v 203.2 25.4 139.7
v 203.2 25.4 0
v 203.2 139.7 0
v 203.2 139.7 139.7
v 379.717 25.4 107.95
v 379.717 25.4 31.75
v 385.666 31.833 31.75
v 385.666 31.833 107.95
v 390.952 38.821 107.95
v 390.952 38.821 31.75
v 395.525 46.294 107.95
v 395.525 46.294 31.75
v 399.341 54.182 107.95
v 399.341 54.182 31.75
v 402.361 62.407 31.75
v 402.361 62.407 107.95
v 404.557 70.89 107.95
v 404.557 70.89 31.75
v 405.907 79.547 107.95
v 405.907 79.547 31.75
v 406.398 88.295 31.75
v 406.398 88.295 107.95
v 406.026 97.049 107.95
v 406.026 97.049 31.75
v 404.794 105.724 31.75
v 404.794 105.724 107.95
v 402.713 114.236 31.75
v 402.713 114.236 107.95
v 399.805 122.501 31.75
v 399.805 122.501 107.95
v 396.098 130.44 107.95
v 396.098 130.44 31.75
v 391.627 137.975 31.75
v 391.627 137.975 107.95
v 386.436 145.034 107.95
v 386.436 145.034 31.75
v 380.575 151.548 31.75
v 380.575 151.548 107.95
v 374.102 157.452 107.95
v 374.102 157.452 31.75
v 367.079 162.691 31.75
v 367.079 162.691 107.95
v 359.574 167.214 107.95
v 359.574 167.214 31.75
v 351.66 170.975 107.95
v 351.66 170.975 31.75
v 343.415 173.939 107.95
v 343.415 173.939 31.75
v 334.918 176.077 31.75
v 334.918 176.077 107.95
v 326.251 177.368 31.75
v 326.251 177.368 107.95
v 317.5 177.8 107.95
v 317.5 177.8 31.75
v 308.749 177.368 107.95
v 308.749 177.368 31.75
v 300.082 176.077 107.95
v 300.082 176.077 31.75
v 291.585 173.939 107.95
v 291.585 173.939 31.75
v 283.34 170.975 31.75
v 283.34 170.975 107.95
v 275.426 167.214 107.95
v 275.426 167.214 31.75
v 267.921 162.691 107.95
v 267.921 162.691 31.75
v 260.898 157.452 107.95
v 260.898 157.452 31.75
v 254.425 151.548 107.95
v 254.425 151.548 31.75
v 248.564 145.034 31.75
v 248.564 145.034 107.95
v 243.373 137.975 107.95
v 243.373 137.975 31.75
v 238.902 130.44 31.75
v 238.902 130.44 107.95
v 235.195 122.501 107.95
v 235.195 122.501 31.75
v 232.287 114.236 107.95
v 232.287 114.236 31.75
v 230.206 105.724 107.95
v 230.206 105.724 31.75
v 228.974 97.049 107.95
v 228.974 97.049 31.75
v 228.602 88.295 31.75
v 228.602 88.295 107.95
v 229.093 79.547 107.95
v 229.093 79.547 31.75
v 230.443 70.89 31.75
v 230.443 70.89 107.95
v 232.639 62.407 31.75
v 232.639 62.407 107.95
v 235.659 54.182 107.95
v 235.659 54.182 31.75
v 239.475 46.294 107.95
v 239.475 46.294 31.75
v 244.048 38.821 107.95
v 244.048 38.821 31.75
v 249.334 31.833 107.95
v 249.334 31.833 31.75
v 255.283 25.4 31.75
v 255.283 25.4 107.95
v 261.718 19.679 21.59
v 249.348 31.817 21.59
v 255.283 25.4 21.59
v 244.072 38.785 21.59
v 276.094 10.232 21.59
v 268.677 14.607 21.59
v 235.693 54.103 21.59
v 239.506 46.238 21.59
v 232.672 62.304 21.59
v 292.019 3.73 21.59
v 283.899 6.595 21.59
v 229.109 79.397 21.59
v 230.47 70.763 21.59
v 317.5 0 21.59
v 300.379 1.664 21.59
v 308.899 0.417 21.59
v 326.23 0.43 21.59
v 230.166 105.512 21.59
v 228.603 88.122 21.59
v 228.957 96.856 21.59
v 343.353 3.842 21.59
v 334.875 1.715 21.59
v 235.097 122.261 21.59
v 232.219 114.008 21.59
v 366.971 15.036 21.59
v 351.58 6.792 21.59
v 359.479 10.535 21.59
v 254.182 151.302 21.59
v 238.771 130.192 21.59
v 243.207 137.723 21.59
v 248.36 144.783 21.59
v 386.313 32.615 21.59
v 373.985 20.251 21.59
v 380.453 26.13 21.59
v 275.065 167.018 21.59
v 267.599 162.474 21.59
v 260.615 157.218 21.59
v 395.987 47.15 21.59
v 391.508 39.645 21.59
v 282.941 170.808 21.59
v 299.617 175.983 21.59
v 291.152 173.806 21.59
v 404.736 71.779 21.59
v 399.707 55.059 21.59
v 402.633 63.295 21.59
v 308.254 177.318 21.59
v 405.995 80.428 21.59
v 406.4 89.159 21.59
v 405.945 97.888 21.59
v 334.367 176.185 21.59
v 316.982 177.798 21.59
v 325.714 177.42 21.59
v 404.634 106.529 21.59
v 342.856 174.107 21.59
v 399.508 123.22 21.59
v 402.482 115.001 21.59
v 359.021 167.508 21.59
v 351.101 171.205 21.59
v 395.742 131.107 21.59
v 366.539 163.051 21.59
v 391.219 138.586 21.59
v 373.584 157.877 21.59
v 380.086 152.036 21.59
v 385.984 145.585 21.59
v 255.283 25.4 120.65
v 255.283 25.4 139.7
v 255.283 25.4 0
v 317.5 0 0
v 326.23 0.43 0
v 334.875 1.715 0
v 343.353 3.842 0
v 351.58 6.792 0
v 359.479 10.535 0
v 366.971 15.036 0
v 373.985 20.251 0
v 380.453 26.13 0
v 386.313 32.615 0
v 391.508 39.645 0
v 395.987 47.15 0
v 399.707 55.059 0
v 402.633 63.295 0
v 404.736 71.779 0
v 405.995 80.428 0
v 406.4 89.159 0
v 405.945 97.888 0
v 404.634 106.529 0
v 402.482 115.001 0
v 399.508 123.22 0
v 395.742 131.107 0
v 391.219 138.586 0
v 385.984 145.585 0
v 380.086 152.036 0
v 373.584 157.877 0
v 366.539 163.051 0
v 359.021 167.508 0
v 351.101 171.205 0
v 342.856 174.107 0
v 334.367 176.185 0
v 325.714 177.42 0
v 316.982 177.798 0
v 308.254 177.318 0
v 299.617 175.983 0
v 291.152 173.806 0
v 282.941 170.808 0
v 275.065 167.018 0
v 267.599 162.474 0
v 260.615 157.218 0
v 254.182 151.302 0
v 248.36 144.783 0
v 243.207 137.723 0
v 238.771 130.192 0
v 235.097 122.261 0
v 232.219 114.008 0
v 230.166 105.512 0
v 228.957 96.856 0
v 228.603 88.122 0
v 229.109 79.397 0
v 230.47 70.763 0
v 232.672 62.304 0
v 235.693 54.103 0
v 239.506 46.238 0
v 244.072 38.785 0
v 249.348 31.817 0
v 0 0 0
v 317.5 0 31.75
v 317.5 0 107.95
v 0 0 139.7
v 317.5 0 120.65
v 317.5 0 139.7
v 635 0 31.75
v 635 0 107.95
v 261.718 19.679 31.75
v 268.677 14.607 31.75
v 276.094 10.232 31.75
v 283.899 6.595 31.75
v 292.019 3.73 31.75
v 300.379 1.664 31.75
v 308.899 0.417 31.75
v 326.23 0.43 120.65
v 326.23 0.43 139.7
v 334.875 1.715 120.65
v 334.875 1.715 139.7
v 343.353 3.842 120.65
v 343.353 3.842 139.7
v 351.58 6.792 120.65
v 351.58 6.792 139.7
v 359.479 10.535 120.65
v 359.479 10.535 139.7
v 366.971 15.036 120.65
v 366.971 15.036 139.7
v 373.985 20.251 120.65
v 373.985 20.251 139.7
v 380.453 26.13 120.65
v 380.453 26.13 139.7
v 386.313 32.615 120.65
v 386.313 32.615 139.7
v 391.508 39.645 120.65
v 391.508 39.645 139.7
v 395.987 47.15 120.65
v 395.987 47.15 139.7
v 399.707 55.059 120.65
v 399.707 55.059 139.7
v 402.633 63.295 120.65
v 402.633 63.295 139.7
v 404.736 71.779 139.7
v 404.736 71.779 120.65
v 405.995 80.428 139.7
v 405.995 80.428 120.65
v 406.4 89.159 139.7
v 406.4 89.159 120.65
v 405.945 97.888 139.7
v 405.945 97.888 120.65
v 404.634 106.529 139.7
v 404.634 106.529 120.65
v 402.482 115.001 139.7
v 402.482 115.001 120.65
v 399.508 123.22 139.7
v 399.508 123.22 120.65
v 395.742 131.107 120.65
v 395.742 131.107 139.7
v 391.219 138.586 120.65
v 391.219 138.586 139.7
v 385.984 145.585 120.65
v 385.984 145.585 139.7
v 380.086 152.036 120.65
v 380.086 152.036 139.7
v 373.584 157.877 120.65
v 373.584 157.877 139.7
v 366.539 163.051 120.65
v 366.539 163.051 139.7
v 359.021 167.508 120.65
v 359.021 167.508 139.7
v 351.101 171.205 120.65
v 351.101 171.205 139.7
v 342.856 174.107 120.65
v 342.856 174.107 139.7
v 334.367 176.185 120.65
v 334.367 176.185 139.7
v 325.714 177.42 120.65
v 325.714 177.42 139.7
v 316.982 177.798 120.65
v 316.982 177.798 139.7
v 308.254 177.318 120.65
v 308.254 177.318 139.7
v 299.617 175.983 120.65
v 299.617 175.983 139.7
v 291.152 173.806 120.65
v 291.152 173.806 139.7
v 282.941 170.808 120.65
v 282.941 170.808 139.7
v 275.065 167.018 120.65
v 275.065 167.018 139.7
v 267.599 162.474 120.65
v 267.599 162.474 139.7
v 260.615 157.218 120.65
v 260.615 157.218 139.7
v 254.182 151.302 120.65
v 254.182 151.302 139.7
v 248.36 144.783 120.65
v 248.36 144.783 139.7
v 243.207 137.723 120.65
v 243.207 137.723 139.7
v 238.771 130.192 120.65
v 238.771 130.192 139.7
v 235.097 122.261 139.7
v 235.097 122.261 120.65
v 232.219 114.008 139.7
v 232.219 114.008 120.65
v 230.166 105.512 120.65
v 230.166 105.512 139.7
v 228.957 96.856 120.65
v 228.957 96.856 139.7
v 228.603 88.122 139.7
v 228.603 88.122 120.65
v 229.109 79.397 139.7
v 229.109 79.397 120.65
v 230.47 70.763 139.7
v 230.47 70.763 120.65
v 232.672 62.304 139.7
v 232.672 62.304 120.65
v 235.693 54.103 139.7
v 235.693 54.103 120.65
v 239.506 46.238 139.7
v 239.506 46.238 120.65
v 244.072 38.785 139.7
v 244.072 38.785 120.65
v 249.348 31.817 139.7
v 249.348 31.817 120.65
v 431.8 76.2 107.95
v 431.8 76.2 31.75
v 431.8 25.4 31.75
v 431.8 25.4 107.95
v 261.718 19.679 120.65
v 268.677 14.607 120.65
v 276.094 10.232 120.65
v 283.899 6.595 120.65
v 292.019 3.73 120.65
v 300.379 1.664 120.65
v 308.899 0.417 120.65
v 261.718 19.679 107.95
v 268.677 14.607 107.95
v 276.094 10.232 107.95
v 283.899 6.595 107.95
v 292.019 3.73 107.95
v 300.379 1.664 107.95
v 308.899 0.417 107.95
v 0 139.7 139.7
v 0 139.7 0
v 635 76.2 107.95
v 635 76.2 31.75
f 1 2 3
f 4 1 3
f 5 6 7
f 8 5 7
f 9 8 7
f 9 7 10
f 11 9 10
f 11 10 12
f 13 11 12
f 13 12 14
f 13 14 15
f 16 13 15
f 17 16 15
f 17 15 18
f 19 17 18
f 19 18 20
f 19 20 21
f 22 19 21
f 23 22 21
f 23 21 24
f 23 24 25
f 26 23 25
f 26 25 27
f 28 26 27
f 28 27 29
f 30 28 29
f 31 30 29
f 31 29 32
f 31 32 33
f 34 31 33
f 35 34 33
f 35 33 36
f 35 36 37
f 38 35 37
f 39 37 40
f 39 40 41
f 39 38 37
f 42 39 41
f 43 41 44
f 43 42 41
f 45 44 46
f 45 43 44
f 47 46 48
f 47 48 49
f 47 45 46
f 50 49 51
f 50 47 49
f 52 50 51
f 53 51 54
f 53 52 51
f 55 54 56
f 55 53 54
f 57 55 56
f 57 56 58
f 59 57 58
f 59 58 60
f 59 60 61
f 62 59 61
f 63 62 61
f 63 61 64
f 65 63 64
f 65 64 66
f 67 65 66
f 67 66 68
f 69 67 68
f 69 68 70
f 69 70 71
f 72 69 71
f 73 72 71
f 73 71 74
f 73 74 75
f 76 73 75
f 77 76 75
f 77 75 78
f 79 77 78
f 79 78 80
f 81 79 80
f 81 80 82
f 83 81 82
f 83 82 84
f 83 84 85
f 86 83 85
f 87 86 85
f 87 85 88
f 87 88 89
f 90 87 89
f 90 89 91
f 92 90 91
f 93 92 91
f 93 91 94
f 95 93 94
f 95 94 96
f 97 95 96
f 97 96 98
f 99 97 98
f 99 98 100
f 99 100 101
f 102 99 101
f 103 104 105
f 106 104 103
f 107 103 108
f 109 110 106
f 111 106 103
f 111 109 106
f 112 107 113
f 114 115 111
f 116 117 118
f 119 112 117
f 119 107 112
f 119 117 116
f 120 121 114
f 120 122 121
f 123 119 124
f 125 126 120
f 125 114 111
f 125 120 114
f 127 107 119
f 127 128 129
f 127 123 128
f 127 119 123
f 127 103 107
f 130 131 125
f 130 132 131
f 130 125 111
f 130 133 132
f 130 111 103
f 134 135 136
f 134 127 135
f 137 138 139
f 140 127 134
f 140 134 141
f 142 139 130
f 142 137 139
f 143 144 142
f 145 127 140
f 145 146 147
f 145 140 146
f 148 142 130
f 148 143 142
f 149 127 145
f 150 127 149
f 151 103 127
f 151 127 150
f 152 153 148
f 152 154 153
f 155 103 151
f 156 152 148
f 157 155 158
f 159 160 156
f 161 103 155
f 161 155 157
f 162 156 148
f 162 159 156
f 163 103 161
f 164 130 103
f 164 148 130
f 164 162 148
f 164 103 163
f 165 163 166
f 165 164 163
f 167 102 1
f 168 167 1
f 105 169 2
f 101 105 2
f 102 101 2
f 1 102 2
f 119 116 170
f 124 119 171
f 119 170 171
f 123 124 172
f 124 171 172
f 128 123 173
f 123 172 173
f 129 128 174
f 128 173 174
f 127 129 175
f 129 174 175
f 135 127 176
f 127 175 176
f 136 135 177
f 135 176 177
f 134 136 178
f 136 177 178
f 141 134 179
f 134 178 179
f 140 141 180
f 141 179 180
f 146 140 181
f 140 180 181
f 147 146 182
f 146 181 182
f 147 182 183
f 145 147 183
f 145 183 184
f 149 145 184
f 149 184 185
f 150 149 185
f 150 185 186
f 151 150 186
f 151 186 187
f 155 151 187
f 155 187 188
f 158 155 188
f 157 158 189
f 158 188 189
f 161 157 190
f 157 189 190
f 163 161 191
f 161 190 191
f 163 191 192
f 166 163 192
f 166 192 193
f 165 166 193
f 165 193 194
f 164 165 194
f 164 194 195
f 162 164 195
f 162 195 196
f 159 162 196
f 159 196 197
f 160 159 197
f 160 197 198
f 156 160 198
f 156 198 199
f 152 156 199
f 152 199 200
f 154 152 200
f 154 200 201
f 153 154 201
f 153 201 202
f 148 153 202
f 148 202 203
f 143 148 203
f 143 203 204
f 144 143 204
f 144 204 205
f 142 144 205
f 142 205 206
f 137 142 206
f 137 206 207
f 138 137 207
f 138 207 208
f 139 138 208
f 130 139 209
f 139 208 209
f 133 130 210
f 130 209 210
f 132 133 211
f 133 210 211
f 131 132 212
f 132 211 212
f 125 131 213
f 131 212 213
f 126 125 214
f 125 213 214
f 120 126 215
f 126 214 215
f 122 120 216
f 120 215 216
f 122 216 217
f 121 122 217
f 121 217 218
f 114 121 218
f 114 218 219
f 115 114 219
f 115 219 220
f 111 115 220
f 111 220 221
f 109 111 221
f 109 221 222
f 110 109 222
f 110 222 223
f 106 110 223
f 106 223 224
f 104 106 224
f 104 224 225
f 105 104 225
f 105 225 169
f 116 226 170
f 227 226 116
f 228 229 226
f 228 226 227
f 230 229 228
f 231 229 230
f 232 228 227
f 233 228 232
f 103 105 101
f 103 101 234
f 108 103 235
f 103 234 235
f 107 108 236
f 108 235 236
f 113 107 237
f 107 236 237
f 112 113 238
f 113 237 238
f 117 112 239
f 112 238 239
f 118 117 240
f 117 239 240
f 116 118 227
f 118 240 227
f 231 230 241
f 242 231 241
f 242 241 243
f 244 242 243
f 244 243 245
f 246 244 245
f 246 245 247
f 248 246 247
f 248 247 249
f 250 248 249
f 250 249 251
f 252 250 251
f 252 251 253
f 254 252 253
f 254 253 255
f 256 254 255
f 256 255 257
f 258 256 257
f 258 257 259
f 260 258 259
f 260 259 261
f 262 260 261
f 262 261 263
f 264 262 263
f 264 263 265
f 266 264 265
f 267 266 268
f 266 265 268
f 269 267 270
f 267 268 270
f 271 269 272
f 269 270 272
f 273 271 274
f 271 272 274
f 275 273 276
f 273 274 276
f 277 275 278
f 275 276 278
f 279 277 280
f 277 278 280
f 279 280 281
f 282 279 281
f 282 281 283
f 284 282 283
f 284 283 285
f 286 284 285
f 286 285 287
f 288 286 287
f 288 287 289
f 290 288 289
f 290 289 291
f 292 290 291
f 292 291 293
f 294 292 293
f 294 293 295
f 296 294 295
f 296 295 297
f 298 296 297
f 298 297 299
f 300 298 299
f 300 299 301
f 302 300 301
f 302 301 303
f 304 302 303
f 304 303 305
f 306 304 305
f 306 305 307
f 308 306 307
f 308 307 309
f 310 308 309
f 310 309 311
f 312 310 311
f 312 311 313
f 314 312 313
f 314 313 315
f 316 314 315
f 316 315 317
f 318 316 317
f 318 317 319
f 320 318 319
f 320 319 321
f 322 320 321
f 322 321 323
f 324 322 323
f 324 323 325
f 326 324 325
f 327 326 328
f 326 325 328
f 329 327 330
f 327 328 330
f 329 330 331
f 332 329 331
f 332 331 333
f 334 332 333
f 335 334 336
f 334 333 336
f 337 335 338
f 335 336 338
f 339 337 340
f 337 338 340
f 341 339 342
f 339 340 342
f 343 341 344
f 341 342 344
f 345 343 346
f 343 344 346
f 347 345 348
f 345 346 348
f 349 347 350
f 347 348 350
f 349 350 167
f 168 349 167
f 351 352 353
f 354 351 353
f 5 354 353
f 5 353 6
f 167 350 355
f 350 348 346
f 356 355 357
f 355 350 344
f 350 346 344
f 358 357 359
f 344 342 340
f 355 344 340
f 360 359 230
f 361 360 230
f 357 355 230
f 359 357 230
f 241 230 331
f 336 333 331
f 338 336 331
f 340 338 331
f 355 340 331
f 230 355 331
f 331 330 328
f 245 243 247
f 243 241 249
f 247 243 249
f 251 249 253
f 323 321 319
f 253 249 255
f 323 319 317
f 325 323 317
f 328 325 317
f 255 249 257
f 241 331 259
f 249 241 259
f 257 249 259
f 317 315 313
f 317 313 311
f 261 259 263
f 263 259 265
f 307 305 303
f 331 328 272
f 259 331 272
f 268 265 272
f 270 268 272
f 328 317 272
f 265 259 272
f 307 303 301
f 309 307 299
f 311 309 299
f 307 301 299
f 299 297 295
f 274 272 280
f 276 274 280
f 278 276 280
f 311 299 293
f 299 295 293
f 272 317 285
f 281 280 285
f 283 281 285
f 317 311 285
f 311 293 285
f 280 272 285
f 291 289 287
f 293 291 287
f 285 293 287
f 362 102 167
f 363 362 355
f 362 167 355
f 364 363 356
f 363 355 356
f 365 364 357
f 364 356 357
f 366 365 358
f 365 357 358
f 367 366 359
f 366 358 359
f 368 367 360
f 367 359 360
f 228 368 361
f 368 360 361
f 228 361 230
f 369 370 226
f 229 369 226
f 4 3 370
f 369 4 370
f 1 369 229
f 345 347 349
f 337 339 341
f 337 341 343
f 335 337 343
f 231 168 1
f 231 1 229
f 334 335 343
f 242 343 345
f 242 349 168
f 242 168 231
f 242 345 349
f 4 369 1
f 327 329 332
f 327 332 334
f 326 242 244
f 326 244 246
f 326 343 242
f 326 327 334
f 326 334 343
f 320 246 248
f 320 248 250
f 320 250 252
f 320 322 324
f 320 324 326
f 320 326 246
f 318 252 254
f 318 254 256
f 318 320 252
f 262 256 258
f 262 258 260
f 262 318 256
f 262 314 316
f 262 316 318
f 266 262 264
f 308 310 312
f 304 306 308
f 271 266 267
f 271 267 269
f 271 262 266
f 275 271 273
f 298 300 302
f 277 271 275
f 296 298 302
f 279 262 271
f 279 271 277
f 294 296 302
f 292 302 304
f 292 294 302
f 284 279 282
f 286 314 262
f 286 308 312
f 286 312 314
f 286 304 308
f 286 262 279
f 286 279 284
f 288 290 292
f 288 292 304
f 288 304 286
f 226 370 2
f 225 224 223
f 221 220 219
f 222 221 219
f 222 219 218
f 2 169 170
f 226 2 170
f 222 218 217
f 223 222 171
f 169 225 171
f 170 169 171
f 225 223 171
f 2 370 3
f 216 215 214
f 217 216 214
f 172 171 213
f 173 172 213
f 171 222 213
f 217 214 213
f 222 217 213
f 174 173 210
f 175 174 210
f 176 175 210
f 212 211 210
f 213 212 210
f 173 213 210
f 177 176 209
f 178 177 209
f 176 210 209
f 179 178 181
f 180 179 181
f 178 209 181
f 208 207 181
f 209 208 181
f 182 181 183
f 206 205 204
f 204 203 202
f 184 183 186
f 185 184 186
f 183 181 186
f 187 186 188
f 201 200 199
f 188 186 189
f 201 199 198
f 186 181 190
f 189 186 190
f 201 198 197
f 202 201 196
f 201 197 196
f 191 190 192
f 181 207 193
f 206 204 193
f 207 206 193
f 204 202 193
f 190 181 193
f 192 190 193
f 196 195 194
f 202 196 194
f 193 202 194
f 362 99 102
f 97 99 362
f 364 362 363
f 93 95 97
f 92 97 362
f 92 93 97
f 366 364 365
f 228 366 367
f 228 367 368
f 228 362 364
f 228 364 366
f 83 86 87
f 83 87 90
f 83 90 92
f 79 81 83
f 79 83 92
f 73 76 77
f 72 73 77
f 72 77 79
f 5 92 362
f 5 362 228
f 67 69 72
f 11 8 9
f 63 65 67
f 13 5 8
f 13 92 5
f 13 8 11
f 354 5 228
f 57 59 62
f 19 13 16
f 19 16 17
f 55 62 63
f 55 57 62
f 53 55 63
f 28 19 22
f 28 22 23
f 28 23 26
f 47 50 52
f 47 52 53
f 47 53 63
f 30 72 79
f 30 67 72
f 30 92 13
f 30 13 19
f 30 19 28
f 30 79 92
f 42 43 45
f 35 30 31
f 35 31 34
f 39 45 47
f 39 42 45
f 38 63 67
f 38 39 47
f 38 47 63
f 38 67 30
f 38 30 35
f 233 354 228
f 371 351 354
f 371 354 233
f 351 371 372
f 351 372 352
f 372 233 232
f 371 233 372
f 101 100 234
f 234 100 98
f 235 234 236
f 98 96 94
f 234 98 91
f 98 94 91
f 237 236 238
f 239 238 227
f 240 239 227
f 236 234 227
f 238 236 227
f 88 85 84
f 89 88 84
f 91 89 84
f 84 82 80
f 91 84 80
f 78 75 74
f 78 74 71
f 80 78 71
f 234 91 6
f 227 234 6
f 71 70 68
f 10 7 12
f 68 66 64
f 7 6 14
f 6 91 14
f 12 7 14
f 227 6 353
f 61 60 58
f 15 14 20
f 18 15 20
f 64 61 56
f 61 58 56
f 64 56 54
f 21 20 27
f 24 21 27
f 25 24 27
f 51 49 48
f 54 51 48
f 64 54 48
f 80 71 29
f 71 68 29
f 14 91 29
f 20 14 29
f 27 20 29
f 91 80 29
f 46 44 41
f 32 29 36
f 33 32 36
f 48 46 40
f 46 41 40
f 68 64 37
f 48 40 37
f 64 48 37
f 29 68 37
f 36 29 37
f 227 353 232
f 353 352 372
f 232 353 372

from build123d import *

# Parameters (mm, degrees)
BOSS_EXTRUDE1_DEPTH      = 139.7
SKETCH2_R                = 88.9
CUT_EXTRUDE1_DEPTH       = 50.8
CUT_EXTRUDE1_DEPTH_BACK  = 48.26
BOSS_EXTRUDE3_DEPTH      = 38.1
BOSS_EXTRUDE3_DEPTH_BACK = 38.1


with BuildPart() as part:
    # Sketch1 → Boss-Extrude1 (new body)
    with BuildSketch(Plane.XY):
        with BuildLine():
            Line((0, 0), (203.2, 0))
            Line((203.2, 0), (317.5, 0))
            ThreePointArc((317.5, 0), (351.101041651, 171.20540687), (255.282960533, 25.4))
            Line((255.282960533, 25.4), (203.2, 25.4))
            Line((203.2, 25.4), (203.2, 139.7))
            Line((203.2, 139.7), (0, 139.7))
            Line((0, 139.7), (0, 0))
        make_face()
    extrude(amount=BOSS_EXTRUDE1_DEPTH)

    # Sketch2 → Cut-Extrude1 (cut, two sides)
    with BuildSketch(Plane.XY.offset(69.85)) as cut_extrude1_sk:
        with Locations((317.5, 88.9)):
            Circle(SKETCH2_R)
    extrude(amount=CUT_EXTRUDE1_DEPTH, mode=Mode.SUBTRACT)
    extrude(cut_extrude1_sk.sketch, amount=-CUT_EXTRUDE1_DEPTH_BACK, mode=Mode.SUBTRACT)

    # Sketch5 → Boss-Extrude3 (add, two sides)
    with BuildSketch(Plane.XY.offset(69.85)) as boss_extrude3_sk:
        with BuildLine():
            Line((317.5, 0), (431.8, 0))
            Line((431.8, 0), (635, 0))
            Line((635, 0), (635, 76.2))
            Line((635, 76.2), (431.8, 76.2))
            Line((431.8, 76.2), (431.8, 25.4))
            Line((431.8, 25.4), (379.717039467, 25.4))
            ThreePointArc((379.717039467, 25.4), (283.898958349, 171.20540687), (317.5, 0))
        make_face()
    extrude(amount=BOSS_EXTRUDE3_DEPTH)
    extrude(boss_extrude3_sk.sketch, amount=-BOSS_EXTRUDE3_DEPTH_BACK)


solid = part.part
